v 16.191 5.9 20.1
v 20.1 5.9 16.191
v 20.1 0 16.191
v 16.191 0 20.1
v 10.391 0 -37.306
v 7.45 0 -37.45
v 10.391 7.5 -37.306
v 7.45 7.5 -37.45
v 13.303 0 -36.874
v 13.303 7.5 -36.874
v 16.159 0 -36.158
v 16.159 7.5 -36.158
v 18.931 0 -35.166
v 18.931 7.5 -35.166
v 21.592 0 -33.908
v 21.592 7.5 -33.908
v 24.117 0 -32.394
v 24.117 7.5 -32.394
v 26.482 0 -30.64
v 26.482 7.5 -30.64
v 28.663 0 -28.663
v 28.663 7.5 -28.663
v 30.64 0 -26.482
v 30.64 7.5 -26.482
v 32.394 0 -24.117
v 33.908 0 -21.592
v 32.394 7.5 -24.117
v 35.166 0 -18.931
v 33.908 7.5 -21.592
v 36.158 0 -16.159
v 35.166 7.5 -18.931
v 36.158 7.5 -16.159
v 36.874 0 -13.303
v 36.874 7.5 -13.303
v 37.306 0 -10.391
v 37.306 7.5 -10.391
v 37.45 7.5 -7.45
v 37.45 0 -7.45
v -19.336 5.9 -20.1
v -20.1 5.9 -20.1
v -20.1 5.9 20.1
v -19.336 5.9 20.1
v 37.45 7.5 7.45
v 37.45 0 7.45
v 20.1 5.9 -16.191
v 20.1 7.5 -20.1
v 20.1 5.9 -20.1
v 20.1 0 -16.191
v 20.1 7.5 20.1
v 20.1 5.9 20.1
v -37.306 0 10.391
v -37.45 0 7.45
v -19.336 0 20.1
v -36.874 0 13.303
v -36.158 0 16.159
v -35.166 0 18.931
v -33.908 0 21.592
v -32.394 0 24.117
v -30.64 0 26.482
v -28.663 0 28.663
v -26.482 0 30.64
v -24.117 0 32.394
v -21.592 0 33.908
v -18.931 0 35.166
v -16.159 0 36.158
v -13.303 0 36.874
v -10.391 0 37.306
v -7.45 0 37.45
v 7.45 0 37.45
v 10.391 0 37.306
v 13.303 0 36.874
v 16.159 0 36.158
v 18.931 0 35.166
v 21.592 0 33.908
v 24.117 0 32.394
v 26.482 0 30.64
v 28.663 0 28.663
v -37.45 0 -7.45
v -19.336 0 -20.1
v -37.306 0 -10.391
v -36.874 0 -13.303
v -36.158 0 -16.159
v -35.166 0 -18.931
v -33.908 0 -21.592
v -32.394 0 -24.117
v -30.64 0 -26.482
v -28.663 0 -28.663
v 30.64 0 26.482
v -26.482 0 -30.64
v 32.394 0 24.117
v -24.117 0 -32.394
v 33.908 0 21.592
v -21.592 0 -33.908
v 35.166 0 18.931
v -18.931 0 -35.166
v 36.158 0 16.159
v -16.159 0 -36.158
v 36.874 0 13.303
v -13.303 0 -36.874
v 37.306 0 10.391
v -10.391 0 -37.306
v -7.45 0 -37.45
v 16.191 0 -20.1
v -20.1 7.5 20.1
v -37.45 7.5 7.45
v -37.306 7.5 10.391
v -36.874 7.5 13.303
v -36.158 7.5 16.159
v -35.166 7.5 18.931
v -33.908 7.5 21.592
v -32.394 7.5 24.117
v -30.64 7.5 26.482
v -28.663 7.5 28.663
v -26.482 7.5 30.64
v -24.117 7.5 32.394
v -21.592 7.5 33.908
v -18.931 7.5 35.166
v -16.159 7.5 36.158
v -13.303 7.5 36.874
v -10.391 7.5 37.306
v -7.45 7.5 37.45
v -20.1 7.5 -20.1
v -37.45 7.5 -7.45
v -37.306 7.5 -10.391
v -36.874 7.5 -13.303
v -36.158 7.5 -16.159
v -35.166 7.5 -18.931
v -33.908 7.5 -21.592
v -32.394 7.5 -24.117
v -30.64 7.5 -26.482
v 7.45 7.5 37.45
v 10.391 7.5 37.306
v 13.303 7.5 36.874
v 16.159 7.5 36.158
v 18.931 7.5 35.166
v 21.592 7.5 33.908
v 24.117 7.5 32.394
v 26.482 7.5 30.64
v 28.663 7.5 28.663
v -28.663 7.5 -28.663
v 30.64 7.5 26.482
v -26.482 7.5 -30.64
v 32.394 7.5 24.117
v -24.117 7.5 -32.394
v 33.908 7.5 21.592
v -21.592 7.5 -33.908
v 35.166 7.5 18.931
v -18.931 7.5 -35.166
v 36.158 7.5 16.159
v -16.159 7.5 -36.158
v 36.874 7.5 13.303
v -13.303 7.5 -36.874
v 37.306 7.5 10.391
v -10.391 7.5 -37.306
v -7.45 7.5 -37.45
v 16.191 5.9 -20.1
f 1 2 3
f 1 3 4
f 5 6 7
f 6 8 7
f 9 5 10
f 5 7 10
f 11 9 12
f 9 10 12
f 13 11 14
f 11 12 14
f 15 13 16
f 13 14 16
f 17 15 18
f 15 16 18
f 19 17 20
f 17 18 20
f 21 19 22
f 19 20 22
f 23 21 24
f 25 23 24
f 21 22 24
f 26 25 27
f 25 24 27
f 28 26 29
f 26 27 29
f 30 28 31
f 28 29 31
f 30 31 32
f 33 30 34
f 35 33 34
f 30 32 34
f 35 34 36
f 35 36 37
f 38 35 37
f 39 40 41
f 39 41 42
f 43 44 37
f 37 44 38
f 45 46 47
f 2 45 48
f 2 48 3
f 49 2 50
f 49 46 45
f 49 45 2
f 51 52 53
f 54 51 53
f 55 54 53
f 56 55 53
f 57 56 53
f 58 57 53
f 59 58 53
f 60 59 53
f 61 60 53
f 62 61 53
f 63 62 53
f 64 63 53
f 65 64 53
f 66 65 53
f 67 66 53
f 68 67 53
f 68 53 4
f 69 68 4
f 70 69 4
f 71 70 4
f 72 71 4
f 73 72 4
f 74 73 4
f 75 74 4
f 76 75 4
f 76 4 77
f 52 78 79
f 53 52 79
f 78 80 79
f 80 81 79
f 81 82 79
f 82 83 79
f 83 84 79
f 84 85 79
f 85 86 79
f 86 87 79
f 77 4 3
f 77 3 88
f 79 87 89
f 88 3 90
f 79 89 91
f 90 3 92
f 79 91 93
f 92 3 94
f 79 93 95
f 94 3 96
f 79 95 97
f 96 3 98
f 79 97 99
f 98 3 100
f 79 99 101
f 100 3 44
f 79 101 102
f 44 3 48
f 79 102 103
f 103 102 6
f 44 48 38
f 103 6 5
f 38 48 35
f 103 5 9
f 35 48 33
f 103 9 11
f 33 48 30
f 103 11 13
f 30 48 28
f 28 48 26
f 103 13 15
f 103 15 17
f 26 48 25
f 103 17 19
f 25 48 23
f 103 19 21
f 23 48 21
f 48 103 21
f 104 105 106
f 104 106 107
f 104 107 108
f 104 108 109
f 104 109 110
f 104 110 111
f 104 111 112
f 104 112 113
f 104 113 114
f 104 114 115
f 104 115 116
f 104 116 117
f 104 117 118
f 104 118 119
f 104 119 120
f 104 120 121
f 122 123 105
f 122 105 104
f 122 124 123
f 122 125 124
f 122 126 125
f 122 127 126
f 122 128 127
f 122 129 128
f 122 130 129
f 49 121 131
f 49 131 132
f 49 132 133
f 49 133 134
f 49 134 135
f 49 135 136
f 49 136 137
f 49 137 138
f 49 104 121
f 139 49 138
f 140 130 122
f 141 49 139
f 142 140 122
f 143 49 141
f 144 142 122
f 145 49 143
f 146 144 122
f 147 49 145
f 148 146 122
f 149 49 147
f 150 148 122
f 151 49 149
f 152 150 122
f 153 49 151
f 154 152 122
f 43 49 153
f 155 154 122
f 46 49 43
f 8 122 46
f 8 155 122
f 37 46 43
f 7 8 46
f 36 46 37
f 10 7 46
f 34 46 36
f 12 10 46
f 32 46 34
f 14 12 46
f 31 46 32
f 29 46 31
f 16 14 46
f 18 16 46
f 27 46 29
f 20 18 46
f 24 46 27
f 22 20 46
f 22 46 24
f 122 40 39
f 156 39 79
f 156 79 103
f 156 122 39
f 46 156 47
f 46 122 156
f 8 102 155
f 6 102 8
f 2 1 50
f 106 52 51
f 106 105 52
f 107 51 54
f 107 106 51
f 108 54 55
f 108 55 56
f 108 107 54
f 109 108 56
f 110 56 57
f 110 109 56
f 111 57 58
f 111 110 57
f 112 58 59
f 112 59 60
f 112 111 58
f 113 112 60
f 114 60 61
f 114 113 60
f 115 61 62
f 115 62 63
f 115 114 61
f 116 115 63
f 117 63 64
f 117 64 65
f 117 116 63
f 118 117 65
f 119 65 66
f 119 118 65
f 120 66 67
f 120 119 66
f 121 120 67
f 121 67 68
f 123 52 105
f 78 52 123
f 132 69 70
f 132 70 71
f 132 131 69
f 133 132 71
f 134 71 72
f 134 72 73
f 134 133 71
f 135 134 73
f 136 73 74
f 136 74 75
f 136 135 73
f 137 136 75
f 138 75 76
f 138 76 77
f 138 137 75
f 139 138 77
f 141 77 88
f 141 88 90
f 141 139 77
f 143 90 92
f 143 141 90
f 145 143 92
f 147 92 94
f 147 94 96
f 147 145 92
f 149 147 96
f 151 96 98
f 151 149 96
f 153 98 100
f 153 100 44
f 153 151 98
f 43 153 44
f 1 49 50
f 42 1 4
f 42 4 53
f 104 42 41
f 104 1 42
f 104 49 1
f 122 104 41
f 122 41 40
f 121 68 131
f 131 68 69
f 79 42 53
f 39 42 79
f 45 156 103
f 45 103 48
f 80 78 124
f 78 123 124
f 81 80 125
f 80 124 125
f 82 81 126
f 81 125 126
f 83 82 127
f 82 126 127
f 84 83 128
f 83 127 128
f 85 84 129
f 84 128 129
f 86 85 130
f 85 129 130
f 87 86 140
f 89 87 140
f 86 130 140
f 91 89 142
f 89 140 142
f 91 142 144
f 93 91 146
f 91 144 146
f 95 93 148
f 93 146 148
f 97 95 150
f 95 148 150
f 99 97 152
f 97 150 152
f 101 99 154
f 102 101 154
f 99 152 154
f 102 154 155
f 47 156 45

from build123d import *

# Parameters (mm, degrees)
SKETCH2_W          = 74.9
SKETCH2_H          = 74.9
BASE_DEPTH         = 7.5
SKETCH3_W          = 40.2
SKETCH3_H          = 40.2
SLOT_DEPTH         = 1.6
CUT_EXTRUDE2_DEPTH = 5.9
FILLET1_R          = 30


with BuildPart() as part:
    # Sketch2 → Base (new body)
    with BuildSketch(Plane(origin=(0, 0, 0), x_dir=(1, 0, 0), z_dir=(0, 1, 0))):
        Rectangle(SKETCH2_W, SKETCH2_H)
    extrude(amount=BASE_DEPTH)

    # Sketch3 → Slot (cut)
    with BuildSketch(Plane(origin=(0, 7.5, 0), x_dir=(1, 0, 0), z_dir=(0, 1, 0))):
        Rectangle(SKETCH3_W, SKETCH3_H)
    extrude(amount=-SLOT_DEPTH, mode=Mode.SUBTRACT)

    # Sketch4 → Cut-Extrude2 (cut)
    with BuildSketch(Plane(origin=(0, 5.9, 0), x_dir=(1, 0, 0), z_dir=(0, 1, 0))):
        Polygon((-19.336485636, -20.1), (-19.336485636, 20.1), (16.190707478, 20.1), (20.1, 16.190707478), (20.1, -16.190707478), (16.190707478, -20.1), align=None)
    extrude(amount=-CUT_EXTRUDE2_DEPTH, mode=Mode.SUBTRACT)

    # Fillet1
    fillet1_edges = [part.edges().sort_by_distance(p)[0] for p in [
        (37.45, 3.75, 37.45),
        (-37.45, 3.75, 37.45),
        (-37.45, 3.75, -37.45),
        (37.45, 3.75, -37.45),
    ]]
    fillet(fillet1_edges, radius=FILLET1_R)


solid = part.part
